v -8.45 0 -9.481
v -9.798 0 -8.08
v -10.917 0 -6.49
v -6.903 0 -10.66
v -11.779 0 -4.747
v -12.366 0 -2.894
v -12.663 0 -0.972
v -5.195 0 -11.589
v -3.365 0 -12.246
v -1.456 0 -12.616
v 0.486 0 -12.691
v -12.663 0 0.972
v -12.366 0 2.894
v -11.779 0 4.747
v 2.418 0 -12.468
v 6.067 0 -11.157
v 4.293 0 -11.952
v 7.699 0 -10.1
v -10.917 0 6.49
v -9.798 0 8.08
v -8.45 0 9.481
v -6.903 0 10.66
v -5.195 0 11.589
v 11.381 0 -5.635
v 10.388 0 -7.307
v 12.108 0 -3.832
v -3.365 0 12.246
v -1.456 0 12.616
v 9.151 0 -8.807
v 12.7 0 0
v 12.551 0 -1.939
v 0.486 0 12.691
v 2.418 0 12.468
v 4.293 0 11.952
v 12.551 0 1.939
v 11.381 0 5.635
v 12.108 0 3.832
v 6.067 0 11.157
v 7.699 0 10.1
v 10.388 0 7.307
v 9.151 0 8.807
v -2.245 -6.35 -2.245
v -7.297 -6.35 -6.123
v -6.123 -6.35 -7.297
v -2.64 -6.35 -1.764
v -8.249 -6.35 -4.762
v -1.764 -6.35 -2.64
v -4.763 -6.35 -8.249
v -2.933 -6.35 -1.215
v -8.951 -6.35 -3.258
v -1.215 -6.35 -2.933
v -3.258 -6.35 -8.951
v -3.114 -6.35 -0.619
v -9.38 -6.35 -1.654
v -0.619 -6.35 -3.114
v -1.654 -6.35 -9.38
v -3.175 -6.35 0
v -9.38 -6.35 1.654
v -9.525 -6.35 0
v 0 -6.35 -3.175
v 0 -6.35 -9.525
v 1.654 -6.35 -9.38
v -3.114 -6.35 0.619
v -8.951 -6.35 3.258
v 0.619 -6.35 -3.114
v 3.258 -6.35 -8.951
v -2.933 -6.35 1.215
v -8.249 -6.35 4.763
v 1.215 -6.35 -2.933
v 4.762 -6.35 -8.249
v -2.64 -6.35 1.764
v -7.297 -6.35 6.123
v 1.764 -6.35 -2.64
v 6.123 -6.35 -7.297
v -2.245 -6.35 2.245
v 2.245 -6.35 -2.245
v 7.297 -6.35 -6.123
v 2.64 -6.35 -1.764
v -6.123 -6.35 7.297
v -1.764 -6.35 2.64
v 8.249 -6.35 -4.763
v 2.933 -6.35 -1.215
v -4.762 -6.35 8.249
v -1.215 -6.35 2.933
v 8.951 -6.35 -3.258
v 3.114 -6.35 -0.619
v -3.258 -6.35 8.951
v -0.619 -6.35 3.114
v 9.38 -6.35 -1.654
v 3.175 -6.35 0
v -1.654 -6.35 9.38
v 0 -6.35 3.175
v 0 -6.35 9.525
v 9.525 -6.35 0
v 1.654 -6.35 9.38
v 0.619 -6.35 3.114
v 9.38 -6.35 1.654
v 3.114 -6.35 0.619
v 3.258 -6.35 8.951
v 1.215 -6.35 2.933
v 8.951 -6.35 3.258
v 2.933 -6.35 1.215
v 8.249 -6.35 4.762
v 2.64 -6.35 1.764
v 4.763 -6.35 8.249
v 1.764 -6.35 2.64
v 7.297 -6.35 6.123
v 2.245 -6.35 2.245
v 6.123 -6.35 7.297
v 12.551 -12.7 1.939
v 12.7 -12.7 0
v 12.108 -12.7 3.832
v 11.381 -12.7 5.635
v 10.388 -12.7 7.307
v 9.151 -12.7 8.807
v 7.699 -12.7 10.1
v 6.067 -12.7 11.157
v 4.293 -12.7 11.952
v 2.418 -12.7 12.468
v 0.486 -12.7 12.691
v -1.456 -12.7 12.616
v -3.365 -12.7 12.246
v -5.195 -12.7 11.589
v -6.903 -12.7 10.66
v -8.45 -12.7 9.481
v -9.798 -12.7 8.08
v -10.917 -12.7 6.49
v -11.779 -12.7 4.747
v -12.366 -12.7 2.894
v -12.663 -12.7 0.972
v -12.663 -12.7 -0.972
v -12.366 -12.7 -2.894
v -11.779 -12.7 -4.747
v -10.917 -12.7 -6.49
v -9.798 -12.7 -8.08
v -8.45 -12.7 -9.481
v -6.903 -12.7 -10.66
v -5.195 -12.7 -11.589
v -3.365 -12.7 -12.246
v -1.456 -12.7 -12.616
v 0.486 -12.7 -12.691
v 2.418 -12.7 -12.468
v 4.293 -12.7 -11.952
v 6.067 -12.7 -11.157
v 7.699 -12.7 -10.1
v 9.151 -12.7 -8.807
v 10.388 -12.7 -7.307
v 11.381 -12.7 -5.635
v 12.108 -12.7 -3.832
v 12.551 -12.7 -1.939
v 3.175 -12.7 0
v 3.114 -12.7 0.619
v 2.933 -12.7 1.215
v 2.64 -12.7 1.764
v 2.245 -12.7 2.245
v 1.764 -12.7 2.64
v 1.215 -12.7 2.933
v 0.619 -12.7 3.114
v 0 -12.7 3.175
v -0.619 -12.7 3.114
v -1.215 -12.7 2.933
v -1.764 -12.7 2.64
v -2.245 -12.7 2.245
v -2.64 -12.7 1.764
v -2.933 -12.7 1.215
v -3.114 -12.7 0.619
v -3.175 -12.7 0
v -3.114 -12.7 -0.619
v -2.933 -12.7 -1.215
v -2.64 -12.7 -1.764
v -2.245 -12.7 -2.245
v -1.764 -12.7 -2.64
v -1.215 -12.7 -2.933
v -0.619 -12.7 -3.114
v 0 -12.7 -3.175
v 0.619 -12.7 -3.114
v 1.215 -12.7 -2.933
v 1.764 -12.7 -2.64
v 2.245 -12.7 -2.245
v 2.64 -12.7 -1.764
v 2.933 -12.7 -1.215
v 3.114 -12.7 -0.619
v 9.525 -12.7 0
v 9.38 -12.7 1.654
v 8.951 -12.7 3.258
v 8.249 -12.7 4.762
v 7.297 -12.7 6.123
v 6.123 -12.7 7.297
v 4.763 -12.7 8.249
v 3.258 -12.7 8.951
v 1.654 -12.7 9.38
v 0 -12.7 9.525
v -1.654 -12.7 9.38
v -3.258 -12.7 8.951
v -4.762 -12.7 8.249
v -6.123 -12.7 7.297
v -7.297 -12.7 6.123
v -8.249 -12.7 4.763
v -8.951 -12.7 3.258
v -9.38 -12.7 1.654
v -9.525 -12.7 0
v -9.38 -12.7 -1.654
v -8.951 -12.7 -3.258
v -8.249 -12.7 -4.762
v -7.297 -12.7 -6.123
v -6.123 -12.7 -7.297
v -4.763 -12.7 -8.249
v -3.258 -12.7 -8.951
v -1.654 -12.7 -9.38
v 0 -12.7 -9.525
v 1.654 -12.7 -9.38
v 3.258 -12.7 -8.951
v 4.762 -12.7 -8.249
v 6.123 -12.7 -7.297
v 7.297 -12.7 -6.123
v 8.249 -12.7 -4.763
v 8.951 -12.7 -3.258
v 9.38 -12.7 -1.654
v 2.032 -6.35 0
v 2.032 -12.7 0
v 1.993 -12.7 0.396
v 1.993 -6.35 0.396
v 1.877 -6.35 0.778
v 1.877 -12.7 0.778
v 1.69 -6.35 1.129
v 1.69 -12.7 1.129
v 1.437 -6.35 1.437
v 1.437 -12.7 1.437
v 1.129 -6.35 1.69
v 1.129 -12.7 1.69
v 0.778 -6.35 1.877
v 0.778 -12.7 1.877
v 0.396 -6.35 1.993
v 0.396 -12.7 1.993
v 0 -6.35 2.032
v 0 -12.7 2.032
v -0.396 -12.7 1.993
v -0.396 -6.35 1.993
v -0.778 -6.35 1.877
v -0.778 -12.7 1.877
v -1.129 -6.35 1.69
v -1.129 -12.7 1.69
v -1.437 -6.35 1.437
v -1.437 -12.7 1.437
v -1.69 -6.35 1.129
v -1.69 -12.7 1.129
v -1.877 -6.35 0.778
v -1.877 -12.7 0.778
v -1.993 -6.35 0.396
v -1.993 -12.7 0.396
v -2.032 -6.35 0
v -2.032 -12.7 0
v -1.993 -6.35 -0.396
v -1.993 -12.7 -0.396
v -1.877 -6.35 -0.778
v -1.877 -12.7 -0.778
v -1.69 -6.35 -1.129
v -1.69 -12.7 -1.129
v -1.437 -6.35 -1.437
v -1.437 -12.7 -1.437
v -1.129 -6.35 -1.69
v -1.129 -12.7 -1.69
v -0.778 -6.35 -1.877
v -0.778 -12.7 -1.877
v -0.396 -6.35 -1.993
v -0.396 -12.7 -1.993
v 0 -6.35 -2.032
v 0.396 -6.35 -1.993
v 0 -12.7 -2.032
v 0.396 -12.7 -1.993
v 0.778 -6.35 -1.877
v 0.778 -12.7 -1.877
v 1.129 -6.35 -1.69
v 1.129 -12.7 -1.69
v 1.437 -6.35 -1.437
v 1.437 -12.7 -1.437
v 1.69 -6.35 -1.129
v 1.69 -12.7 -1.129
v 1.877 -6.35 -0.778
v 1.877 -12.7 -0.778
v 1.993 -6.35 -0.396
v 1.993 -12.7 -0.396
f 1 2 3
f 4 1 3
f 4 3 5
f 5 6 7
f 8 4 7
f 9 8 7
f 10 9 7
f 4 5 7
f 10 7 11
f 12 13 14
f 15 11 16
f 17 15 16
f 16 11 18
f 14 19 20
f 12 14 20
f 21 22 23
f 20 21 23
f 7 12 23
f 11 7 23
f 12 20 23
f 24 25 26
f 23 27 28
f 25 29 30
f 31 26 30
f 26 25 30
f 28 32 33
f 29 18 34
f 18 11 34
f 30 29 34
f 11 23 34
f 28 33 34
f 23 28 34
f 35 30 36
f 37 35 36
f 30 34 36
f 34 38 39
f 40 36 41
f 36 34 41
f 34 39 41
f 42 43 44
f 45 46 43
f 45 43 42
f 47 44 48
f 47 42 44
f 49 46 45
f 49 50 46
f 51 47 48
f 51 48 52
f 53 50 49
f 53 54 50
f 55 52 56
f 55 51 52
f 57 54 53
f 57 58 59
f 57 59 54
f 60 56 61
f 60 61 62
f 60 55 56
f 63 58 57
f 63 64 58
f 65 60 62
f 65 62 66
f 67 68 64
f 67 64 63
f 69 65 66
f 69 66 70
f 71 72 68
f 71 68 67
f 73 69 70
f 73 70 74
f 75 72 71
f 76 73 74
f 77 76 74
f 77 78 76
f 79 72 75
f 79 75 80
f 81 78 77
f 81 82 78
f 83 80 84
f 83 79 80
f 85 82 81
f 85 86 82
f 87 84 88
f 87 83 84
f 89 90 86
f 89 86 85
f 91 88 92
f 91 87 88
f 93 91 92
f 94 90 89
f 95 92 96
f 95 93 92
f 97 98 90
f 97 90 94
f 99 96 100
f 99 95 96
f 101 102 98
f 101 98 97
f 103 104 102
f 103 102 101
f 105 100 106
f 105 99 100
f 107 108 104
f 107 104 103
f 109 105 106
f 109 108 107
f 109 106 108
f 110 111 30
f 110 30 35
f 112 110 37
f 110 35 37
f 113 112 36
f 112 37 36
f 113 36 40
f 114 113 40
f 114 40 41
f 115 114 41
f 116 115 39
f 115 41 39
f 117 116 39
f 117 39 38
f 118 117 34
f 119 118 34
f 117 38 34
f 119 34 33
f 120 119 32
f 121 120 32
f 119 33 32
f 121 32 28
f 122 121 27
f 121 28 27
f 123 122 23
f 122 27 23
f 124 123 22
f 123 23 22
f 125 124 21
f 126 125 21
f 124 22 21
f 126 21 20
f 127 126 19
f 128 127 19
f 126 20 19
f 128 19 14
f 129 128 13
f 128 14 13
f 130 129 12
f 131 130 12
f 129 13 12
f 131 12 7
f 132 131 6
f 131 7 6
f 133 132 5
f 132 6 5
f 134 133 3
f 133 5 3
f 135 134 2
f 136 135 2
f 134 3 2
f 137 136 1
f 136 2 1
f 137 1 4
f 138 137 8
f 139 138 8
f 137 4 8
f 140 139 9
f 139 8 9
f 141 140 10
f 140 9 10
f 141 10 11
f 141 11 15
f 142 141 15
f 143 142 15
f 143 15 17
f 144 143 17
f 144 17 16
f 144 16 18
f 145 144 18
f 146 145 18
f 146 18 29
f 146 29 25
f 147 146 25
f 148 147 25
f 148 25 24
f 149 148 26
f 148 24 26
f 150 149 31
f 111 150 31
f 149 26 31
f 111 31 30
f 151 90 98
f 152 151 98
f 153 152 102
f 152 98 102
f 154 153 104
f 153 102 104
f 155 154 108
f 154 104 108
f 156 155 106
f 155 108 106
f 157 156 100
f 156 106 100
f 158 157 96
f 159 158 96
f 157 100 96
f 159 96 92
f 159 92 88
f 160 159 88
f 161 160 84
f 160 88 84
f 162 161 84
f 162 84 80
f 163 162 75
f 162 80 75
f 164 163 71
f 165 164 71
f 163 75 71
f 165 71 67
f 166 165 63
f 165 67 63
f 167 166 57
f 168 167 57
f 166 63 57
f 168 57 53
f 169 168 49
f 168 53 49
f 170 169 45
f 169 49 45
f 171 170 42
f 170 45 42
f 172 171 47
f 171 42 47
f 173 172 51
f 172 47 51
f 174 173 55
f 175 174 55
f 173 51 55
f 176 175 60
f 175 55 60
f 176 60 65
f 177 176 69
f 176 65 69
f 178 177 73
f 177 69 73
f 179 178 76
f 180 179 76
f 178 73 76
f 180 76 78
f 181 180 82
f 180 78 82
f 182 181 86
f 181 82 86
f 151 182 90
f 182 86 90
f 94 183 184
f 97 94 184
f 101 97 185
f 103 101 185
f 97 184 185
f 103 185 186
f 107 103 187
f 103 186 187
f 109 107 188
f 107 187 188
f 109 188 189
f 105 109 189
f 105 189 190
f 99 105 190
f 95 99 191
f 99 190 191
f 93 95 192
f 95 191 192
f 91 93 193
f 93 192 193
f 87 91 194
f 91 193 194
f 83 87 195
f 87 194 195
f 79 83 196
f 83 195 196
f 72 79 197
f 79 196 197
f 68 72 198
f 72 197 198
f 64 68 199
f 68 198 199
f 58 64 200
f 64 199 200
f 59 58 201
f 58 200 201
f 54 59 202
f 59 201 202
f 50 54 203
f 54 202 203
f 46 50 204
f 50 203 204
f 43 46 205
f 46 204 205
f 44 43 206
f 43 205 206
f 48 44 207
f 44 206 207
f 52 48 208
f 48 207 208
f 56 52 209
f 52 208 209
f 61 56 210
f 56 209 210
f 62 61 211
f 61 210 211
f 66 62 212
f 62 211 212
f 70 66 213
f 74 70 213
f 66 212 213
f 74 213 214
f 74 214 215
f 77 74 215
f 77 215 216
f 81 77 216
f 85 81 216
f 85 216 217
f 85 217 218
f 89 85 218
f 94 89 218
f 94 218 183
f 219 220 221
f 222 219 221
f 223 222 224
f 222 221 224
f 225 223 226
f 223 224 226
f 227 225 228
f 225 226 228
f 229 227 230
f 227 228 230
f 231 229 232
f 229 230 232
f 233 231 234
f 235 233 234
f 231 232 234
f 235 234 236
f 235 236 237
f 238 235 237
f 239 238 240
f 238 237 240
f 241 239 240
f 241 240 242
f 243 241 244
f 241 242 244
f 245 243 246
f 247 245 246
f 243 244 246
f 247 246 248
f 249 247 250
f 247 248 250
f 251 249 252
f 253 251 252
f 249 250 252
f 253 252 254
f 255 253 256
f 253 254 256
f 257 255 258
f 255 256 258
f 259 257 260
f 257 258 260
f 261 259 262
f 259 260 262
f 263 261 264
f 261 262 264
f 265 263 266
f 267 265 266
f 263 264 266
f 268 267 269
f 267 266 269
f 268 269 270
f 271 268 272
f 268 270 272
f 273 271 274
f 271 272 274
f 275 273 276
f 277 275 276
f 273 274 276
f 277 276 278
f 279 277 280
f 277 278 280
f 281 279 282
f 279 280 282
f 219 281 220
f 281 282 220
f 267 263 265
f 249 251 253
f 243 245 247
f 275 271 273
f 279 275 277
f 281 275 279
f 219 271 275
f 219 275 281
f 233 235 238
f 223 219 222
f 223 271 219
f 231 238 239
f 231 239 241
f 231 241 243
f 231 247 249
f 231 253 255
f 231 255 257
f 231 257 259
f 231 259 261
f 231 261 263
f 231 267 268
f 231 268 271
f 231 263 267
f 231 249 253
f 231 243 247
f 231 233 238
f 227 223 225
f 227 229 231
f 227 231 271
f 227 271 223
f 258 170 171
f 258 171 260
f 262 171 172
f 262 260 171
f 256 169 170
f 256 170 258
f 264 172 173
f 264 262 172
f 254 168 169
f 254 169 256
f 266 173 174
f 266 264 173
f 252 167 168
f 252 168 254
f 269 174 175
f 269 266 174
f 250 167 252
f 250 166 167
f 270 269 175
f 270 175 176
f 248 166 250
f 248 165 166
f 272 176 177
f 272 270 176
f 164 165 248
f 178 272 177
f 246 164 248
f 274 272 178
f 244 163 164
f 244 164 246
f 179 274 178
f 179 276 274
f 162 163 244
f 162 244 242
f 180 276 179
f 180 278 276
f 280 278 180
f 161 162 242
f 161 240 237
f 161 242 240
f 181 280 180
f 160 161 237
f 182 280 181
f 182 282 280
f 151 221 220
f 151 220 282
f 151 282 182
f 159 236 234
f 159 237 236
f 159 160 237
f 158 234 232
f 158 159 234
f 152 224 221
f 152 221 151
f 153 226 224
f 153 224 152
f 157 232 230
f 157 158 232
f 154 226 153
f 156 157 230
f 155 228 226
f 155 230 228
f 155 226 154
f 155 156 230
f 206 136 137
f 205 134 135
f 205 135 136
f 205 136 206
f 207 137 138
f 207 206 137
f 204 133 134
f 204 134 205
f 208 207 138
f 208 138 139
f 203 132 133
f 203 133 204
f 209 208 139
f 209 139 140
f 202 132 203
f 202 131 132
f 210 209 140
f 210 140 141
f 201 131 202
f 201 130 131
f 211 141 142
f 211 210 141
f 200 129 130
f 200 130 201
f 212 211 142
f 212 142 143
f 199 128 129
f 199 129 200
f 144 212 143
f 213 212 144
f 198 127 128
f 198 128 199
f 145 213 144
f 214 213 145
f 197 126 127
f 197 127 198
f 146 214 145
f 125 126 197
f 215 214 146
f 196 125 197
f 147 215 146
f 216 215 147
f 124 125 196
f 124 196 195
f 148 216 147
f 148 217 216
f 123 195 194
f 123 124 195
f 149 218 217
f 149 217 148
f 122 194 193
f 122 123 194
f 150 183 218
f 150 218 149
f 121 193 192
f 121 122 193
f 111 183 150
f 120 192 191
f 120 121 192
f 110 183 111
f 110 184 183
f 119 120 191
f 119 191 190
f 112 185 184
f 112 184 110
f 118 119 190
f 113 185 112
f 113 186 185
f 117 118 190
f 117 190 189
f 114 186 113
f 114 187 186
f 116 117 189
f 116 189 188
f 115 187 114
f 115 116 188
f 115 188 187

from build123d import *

# Parameters (mm, degrees)
F0_R     = 12.7
F1_DEPTH = 12.7
F2_R     = 9.525
F3_DEPTH = 6.35
F4_R     = 3.175
F5_DEPTH = 6.35
F6_R     = 2.032
F7_DEPTH = 6.35


with BuildPart() as f1:
    # F0 (on Front) → F1 (new body)
    with BuildSketch(Plane.XZ):
        Circle(F0_R)
    extrude(amount=F1_DEPTH)

    # F2 (on face) → F3 (cut)
    with BuildSketch(Plane.XZ.offset(12.7)):
        Circle(F2_R)
    extrude(amount=-F3_DEPTH, mode=Mode.SUBTRACT)

    # F4 (on face) → F5 (join, through all)
    with BuildSketch(Plane.XZ.offset(6.35)):
        Circle(F4_R)
    extrude(amount=F5_DEPTH)

    # F6 (on face) → F7 (cut, through all)
    with BuildSketch(Plane.XZ.offset(12.7)):
        Circle(F6_R)
    extrude(amount=-F7_DEPTH, mode=Mode.SUBTRACT)


solid = f1.part
